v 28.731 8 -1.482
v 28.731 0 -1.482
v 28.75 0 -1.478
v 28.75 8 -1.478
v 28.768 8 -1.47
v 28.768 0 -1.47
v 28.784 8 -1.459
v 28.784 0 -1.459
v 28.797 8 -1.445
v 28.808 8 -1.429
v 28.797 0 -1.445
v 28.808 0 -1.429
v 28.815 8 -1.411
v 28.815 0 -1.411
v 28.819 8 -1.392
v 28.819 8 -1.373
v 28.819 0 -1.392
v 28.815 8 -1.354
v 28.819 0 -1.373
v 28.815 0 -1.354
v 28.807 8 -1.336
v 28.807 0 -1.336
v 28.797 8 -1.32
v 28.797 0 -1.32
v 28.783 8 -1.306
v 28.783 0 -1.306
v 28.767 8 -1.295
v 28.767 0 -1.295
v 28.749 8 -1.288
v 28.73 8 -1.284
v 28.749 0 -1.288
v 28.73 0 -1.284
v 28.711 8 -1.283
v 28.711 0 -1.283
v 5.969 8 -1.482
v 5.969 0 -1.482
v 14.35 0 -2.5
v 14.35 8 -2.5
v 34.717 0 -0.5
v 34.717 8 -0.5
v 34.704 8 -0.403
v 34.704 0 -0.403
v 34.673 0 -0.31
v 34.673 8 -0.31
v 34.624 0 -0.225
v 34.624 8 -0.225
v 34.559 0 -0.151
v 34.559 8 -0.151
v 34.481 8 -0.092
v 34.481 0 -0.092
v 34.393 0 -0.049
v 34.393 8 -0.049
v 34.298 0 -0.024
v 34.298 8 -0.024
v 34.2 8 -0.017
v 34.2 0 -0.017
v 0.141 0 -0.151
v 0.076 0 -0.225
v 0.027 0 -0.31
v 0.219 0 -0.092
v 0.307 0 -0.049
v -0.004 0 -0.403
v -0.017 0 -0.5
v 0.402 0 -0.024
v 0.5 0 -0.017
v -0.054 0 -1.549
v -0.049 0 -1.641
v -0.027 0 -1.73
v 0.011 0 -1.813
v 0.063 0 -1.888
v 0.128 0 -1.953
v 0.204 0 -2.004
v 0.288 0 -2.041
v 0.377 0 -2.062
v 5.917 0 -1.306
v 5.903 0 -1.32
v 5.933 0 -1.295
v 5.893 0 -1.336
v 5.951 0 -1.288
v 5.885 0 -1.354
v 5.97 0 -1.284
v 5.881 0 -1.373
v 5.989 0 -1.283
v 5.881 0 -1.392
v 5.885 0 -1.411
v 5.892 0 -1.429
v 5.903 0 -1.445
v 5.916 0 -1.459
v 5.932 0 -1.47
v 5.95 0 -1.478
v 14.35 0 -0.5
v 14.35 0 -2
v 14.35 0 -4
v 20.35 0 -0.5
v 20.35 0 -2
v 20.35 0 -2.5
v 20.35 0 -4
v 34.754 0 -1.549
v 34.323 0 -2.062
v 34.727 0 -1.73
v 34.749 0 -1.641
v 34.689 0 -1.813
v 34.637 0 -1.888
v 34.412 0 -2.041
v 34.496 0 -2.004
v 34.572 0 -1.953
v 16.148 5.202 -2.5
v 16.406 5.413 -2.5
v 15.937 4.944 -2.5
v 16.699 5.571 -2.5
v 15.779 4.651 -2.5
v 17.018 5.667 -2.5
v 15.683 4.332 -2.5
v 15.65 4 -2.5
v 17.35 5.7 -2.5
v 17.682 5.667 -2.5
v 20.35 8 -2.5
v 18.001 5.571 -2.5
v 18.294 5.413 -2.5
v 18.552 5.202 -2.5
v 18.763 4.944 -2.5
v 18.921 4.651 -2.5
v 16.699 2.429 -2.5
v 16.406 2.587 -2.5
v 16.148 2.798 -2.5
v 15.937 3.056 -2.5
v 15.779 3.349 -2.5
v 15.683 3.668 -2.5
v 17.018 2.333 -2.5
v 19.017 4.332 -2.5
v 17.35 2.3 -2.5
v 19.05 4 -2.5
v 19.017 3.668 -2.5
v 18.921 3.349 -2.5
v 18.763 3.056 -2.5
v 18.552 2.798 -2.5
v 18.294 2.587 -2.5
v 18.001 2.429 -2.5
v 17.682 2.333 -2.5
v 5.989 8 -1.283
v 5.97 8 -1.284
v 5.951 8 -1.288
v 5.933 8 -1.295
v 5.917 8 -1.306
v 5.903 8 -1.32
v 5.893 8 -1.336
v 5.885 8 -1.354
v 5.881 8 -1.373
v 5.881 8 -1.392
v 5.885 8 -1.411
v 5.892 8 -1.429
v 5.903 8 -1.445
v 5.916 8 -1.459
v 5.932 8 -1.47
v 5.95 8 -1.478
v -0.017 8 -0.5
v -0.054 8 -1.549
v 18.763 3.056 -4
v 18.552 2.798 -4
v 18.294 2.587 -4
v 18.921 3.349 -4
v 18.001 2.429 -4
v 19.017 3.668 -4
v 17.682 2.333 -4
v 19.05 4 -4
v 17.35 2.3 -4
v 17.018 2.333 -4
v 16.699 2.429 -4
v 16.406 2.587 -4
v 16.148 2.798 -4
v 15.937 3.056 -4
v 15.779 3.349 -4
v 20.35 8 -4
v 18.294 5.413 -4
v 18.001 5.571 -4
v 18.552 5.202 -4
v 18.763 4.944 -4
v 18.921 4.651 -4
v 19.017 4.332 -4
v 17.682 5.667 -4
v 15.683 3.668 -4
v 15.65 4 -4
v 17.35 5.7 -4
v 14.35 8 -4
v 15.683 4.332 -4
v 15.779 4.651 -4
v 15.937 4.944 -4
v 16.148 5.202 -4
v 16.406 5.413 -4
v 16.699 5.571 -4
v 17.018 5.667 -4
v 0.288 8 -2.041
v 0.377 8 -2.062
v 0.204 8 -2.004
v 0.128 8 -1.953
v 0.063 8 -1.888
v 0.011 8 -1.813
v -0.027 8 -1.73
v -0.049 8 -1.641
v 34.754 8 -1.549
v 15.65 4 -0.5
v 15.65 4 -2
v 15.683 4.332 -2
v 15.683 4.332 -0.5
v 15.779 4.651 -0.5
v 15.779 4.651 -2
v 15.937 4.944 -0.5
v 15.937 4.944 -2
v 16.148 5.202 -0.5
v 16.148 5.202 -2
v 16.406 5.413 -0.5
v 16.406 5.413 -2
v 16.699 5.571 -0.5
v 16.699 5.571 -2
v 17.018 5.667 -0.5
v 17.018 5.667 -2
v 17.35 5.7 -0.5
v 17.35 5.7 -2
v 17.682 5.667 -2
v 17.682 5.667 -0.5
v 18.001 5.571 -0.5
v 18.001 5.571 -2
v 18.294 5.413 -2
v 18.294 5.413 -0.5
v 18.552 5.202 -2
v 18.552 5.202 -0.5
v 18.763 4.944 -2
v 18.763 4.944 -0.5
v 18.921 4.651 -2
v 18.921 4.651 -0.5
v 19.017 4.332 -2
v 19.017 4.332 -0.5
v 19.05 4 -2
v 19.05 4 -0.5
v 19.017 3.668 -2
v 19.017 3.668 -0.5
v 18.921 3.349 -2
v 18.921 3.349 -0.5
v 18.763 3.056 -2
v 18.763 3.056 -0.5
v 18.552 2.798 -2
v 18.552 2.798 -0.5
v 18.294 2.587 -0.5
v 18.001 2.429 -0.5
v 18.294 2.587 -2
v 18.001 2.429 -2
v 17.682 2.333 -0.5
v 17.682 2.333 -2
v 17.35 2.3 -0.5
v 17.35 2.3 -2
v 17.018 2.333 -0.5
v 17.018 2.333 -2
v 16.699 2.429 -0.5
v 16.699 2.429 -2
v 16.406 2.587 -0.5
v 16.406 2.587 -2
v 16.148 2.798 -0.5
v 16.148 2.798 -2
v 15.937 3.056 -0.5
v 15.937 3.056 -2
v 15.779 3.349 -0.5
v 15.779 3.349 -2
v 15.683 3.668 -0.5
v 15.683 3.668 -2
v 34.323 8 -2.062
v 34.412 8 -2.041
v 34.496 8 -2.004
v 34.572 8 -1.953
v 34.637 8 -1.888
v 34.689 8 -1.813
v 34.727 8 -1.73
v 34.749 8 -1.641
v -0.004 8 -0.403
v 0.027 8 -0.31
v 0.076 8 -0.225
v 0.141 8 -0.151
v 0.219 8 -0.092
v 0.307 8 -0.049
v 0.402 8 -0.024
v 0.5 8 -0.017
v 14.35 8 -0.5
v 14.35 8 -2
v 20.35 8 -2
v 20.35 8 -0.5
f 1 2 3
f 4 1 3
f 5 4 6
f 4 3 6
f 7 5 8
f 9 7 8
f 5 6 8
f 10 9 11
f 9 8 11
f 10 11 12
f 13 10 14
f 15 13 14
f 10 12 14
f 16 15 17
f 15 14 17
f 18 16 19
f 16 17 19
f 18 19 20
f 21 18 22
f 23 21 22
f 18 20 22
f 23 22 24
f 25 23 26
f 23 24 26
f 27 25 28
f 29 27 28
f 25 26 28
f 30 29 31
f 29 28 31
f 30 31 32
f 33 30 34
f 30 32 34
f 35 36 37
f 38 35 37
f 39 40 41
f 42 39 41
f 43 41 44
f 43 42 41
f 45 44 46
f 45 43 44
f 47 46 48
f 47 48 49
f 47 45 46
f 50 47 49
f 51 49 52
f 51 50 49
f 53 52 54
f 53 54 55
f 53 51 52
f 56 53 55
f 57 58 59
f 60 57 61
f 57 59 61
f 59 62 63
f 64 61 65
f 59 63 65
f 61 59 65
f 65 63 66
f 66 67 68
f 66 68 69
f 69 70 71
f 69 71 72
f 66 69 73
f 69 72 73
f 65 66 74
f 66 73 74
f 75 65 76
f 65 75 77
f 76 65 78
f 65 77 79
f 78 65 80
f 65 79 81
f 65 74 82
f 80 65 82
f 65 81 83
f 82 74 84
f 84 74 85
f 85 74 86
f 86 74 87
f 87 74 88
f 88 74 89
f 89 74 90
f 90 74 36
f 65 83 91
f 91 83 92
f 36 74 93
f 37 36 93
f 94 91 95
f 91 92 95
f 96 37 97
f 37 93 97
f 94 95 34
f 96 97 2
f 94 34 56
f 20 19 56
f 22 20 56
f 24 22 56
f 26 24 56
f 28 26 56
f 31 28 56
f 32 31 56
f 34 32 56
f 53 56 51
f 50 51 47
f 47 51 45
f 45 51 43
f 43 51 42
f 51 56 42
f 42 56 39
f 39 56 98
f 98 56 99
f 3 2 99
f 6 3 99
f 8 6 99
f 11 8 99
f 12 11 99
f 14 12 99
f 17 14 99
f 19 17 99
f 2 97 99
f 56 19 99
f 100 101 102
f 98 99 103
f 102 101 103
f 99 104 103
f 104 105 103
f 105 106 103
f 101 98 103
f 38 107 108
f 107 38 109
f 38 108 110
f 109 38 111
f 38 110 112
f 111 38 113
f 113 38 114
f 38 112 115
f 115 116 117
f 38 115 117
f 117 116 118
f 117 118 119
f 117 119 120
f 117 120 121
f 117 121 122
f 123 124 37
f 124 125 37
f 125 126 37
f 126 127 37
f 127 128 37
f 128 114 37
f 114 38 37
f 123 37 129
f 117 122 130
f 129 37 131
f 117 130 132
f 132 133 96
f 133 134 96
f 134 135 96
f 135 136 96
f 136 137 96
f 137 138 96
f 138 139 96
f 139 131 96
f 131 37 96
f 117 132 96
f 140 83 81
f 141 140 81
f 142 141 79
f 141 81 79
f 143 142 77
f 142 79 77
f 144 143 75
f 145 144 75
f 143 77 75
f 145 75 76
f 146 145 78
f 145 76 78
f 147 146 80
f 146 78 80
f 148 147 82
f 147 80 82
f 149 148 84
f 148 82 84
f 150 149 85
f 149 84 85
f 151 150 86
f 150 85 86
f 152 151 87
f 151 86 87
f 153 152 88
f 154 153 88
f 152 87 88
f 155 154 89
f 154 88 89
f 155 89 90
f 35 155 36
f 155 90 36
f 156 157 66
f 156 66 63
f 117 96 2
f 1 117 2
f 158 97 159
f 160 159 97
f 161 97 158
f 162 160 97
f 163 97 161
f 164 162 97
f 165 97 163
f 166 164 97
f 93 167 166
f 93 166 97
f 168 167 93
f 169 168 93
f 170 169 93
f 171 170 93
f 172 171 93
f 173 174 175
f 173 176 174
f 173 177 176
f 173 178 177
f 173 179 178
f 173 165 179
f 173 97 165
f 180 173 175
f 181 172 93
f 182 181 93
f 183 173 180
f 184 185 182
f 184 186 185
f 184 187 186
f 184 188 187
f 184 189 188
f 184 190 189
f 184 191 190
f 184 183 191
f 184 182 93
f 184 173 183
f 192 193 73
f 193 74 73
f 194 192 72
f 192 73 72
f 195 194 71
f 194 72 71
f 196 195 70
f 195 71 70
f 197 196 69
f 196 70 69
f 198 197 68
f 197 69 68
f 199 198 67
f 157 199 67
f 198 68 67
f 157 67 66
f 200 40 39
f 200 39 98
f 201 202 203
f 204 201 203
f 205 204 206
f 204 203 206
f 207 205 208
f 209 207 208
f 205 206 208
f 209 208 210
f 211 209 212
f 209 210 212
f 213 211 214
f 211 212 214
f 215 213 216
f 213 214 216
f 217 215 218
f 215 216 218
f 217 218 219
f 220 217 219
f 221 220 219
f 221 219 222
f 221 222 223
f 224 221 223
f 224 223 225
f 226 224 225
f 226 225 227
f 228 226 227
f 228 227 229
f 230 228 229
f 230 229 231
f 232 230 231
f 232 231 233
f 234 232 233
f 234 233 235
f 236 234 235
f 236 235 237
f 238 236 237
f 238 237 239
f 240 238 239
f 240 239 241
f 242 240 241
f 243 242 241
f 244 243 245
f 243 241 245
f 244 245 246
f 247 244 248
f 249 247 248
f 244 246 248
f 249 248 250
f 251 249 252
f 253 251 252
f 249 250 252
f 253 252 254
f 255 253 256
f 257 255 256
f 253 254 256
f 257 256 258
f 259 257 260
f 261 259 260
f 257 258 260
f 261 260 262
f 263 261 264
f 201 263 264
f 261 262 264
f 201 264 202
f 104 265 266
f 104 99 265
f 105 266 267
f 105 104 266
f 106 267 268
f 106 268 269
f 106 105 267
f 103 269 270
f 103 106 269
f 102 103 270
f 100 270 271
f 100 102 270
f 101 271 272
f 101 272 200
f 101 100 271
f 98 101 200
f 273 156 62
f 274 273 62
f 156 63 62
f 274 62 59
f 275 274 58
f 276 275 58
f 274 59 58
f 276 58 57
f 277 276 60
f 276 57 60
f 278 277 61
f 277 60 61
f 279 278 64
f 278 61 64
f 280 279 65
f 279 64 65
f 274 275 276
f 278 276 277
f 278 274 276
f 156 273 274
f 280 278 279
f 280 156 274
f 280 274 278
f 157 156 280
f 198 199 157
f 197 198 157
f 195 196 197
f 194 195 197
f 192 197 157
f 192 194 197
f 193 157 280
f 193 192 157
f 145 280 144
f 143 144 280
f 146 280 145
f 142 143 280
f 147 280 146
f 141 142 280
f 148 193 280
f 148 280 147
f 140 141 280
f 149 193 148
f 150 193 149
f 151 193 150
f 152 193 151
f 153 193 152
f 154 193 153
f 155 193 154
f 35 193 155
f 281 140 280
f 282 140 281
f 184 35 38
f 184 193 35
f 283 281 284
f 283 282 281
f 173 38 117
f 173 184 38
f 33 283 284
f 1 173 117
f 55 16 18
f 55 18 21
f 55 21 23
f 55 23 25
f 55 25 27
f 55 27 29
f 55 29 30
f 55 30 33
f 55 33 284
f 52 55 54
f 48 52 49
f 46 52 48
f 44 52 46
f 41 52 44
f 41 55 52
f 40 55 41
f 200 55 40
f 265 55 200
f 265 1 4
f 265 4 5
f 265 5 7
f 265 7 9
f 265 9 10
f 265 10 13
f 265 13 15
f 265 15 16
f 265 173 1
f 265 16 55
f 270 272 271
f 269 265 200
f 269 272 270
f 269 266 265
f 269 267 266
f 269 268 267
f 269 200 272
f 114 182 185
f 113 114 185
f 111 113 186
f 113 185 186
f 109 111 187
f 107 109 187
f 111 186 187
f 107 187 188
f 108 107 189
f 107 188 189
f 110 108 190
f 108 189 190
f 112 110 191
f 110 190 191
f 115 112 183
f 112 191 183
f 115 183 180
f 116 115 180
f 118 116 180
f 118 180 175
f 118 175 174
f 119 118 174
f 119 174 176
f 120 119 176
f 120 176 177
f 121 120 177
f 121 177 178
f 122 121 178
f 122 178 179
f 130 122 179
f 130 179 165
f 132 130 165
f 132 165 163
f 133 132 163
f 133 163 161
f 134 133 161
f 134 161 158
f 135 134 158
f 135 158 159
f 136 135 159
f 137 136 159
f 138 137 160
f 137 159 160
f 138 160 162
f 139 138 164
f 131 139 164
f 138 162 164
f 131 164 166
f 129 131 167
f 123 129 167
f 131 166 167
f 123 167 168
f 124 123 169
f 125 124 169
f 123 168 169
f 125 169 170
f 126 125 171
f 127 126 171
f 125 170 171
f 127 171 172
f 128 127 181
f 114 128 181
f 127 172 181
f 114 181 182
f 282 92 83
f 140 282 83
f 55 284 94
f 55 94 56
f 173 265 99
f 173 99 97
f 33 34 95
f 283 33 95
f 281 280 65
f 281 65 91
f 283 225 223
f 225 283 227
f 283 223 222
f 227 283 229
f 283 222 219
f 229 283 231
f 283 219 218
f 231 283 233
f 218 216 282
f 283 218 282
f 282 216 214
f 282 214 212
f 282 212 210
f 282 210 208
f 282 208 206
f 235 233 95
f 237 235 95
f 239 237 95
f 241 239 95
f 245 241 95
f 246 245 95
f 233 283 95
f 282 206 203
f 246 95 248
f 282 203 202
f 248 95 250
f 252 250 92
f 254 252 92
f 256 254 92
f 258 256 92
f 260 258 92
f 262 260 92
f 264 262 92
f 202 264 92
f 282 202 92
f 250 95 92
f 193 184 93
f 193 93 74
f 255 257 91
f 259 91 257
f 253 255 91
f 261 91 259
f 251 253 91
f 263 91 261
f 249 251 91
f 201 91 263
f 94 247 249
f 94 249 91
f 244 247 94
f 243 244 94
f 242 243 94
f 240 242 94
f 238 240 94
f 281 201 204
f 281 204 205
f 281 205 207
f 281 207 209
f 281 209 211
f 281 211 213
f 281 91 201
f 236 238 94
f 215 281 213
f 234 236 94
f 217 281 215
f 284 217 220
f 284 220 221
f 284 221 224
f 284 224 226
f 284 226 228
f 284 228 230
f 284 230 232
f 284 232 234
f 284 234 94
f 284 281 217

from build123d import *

# Parameters (mm, degrees)
BOSS_EXTRUDE1_DEPTH  = 8
CUT_EXTRUDE1_DEPTH   = 9
M3_CLEARANCE_HOLE1_D = 3.4
FILLET1_R            = 0.5


with BuildPart() as part:
    # Sketch1 → Boss-Extrude1 (new body)
    with BuildSketch(Plane(origin=(0, 8, 0), x_dir=(1, 0, 0), z_dir=(0, 1, 0))):
        Polygon((34.769686411, 2), (20.35, 4), (14.35, 4), (-0.069686411, 2), (0, 0), (14.35, 0.5), (20.35, 0.5), (34.7, 0), align=None)
    extrude(amount=-BOSS_EXTRUDE1_DEPTH)

    # Sketch2 → Cut-Extrude1 (cut, through all)
    with BuildSketch(Plane.XZ):
        with BuildLine():
            Line((5.968779898, -1.482280416), (14.35, -2.5))
            Line((14.35, -2.5), (20.35, -2.5))
            Line((20.35, -2.5), (28.731220102, -1.482280416))
            ThreePointArc((28.731220102, -1.482280416), (28.818634048, -1.372710787), (28.710625676, -1.283374942))
            Line((28.710625676, -1.283374942), (20.35, -2))
            Line((20.35, -2), (14.35, -2))
            Line((14.35, -2), (5.989374324, -1.283374942))
            ThreePointArc((5.989374324, -1.283374942), (5.881365952, -1.372710787), (5.968779898, -1.482280416))
        make_face()
    extrude(amount=-CUT_EXTRUDE1_DEPTH, mode=Mode.SUBTRACT)

    # M3 Clearance Hole1 (through all)
    with Locations(Plane.XY.offset(-0.5)):
        with Locations((17.35, 4)):
            Hole(M3_CLEARANCE_HOLE1_D / 2)

    # Fillet1
    fillet1_edges = [part.edges().sort_by_distance(p)[0] for p in [
        (34.7, 4, 0),
        (0, 4, 0),
        (-0.069686411, 4, -2),
        (34.769686411, 4, -2),
    ]]
    fillet(fillet1_edges, radius=FILLET1_R)


solid = part.part
